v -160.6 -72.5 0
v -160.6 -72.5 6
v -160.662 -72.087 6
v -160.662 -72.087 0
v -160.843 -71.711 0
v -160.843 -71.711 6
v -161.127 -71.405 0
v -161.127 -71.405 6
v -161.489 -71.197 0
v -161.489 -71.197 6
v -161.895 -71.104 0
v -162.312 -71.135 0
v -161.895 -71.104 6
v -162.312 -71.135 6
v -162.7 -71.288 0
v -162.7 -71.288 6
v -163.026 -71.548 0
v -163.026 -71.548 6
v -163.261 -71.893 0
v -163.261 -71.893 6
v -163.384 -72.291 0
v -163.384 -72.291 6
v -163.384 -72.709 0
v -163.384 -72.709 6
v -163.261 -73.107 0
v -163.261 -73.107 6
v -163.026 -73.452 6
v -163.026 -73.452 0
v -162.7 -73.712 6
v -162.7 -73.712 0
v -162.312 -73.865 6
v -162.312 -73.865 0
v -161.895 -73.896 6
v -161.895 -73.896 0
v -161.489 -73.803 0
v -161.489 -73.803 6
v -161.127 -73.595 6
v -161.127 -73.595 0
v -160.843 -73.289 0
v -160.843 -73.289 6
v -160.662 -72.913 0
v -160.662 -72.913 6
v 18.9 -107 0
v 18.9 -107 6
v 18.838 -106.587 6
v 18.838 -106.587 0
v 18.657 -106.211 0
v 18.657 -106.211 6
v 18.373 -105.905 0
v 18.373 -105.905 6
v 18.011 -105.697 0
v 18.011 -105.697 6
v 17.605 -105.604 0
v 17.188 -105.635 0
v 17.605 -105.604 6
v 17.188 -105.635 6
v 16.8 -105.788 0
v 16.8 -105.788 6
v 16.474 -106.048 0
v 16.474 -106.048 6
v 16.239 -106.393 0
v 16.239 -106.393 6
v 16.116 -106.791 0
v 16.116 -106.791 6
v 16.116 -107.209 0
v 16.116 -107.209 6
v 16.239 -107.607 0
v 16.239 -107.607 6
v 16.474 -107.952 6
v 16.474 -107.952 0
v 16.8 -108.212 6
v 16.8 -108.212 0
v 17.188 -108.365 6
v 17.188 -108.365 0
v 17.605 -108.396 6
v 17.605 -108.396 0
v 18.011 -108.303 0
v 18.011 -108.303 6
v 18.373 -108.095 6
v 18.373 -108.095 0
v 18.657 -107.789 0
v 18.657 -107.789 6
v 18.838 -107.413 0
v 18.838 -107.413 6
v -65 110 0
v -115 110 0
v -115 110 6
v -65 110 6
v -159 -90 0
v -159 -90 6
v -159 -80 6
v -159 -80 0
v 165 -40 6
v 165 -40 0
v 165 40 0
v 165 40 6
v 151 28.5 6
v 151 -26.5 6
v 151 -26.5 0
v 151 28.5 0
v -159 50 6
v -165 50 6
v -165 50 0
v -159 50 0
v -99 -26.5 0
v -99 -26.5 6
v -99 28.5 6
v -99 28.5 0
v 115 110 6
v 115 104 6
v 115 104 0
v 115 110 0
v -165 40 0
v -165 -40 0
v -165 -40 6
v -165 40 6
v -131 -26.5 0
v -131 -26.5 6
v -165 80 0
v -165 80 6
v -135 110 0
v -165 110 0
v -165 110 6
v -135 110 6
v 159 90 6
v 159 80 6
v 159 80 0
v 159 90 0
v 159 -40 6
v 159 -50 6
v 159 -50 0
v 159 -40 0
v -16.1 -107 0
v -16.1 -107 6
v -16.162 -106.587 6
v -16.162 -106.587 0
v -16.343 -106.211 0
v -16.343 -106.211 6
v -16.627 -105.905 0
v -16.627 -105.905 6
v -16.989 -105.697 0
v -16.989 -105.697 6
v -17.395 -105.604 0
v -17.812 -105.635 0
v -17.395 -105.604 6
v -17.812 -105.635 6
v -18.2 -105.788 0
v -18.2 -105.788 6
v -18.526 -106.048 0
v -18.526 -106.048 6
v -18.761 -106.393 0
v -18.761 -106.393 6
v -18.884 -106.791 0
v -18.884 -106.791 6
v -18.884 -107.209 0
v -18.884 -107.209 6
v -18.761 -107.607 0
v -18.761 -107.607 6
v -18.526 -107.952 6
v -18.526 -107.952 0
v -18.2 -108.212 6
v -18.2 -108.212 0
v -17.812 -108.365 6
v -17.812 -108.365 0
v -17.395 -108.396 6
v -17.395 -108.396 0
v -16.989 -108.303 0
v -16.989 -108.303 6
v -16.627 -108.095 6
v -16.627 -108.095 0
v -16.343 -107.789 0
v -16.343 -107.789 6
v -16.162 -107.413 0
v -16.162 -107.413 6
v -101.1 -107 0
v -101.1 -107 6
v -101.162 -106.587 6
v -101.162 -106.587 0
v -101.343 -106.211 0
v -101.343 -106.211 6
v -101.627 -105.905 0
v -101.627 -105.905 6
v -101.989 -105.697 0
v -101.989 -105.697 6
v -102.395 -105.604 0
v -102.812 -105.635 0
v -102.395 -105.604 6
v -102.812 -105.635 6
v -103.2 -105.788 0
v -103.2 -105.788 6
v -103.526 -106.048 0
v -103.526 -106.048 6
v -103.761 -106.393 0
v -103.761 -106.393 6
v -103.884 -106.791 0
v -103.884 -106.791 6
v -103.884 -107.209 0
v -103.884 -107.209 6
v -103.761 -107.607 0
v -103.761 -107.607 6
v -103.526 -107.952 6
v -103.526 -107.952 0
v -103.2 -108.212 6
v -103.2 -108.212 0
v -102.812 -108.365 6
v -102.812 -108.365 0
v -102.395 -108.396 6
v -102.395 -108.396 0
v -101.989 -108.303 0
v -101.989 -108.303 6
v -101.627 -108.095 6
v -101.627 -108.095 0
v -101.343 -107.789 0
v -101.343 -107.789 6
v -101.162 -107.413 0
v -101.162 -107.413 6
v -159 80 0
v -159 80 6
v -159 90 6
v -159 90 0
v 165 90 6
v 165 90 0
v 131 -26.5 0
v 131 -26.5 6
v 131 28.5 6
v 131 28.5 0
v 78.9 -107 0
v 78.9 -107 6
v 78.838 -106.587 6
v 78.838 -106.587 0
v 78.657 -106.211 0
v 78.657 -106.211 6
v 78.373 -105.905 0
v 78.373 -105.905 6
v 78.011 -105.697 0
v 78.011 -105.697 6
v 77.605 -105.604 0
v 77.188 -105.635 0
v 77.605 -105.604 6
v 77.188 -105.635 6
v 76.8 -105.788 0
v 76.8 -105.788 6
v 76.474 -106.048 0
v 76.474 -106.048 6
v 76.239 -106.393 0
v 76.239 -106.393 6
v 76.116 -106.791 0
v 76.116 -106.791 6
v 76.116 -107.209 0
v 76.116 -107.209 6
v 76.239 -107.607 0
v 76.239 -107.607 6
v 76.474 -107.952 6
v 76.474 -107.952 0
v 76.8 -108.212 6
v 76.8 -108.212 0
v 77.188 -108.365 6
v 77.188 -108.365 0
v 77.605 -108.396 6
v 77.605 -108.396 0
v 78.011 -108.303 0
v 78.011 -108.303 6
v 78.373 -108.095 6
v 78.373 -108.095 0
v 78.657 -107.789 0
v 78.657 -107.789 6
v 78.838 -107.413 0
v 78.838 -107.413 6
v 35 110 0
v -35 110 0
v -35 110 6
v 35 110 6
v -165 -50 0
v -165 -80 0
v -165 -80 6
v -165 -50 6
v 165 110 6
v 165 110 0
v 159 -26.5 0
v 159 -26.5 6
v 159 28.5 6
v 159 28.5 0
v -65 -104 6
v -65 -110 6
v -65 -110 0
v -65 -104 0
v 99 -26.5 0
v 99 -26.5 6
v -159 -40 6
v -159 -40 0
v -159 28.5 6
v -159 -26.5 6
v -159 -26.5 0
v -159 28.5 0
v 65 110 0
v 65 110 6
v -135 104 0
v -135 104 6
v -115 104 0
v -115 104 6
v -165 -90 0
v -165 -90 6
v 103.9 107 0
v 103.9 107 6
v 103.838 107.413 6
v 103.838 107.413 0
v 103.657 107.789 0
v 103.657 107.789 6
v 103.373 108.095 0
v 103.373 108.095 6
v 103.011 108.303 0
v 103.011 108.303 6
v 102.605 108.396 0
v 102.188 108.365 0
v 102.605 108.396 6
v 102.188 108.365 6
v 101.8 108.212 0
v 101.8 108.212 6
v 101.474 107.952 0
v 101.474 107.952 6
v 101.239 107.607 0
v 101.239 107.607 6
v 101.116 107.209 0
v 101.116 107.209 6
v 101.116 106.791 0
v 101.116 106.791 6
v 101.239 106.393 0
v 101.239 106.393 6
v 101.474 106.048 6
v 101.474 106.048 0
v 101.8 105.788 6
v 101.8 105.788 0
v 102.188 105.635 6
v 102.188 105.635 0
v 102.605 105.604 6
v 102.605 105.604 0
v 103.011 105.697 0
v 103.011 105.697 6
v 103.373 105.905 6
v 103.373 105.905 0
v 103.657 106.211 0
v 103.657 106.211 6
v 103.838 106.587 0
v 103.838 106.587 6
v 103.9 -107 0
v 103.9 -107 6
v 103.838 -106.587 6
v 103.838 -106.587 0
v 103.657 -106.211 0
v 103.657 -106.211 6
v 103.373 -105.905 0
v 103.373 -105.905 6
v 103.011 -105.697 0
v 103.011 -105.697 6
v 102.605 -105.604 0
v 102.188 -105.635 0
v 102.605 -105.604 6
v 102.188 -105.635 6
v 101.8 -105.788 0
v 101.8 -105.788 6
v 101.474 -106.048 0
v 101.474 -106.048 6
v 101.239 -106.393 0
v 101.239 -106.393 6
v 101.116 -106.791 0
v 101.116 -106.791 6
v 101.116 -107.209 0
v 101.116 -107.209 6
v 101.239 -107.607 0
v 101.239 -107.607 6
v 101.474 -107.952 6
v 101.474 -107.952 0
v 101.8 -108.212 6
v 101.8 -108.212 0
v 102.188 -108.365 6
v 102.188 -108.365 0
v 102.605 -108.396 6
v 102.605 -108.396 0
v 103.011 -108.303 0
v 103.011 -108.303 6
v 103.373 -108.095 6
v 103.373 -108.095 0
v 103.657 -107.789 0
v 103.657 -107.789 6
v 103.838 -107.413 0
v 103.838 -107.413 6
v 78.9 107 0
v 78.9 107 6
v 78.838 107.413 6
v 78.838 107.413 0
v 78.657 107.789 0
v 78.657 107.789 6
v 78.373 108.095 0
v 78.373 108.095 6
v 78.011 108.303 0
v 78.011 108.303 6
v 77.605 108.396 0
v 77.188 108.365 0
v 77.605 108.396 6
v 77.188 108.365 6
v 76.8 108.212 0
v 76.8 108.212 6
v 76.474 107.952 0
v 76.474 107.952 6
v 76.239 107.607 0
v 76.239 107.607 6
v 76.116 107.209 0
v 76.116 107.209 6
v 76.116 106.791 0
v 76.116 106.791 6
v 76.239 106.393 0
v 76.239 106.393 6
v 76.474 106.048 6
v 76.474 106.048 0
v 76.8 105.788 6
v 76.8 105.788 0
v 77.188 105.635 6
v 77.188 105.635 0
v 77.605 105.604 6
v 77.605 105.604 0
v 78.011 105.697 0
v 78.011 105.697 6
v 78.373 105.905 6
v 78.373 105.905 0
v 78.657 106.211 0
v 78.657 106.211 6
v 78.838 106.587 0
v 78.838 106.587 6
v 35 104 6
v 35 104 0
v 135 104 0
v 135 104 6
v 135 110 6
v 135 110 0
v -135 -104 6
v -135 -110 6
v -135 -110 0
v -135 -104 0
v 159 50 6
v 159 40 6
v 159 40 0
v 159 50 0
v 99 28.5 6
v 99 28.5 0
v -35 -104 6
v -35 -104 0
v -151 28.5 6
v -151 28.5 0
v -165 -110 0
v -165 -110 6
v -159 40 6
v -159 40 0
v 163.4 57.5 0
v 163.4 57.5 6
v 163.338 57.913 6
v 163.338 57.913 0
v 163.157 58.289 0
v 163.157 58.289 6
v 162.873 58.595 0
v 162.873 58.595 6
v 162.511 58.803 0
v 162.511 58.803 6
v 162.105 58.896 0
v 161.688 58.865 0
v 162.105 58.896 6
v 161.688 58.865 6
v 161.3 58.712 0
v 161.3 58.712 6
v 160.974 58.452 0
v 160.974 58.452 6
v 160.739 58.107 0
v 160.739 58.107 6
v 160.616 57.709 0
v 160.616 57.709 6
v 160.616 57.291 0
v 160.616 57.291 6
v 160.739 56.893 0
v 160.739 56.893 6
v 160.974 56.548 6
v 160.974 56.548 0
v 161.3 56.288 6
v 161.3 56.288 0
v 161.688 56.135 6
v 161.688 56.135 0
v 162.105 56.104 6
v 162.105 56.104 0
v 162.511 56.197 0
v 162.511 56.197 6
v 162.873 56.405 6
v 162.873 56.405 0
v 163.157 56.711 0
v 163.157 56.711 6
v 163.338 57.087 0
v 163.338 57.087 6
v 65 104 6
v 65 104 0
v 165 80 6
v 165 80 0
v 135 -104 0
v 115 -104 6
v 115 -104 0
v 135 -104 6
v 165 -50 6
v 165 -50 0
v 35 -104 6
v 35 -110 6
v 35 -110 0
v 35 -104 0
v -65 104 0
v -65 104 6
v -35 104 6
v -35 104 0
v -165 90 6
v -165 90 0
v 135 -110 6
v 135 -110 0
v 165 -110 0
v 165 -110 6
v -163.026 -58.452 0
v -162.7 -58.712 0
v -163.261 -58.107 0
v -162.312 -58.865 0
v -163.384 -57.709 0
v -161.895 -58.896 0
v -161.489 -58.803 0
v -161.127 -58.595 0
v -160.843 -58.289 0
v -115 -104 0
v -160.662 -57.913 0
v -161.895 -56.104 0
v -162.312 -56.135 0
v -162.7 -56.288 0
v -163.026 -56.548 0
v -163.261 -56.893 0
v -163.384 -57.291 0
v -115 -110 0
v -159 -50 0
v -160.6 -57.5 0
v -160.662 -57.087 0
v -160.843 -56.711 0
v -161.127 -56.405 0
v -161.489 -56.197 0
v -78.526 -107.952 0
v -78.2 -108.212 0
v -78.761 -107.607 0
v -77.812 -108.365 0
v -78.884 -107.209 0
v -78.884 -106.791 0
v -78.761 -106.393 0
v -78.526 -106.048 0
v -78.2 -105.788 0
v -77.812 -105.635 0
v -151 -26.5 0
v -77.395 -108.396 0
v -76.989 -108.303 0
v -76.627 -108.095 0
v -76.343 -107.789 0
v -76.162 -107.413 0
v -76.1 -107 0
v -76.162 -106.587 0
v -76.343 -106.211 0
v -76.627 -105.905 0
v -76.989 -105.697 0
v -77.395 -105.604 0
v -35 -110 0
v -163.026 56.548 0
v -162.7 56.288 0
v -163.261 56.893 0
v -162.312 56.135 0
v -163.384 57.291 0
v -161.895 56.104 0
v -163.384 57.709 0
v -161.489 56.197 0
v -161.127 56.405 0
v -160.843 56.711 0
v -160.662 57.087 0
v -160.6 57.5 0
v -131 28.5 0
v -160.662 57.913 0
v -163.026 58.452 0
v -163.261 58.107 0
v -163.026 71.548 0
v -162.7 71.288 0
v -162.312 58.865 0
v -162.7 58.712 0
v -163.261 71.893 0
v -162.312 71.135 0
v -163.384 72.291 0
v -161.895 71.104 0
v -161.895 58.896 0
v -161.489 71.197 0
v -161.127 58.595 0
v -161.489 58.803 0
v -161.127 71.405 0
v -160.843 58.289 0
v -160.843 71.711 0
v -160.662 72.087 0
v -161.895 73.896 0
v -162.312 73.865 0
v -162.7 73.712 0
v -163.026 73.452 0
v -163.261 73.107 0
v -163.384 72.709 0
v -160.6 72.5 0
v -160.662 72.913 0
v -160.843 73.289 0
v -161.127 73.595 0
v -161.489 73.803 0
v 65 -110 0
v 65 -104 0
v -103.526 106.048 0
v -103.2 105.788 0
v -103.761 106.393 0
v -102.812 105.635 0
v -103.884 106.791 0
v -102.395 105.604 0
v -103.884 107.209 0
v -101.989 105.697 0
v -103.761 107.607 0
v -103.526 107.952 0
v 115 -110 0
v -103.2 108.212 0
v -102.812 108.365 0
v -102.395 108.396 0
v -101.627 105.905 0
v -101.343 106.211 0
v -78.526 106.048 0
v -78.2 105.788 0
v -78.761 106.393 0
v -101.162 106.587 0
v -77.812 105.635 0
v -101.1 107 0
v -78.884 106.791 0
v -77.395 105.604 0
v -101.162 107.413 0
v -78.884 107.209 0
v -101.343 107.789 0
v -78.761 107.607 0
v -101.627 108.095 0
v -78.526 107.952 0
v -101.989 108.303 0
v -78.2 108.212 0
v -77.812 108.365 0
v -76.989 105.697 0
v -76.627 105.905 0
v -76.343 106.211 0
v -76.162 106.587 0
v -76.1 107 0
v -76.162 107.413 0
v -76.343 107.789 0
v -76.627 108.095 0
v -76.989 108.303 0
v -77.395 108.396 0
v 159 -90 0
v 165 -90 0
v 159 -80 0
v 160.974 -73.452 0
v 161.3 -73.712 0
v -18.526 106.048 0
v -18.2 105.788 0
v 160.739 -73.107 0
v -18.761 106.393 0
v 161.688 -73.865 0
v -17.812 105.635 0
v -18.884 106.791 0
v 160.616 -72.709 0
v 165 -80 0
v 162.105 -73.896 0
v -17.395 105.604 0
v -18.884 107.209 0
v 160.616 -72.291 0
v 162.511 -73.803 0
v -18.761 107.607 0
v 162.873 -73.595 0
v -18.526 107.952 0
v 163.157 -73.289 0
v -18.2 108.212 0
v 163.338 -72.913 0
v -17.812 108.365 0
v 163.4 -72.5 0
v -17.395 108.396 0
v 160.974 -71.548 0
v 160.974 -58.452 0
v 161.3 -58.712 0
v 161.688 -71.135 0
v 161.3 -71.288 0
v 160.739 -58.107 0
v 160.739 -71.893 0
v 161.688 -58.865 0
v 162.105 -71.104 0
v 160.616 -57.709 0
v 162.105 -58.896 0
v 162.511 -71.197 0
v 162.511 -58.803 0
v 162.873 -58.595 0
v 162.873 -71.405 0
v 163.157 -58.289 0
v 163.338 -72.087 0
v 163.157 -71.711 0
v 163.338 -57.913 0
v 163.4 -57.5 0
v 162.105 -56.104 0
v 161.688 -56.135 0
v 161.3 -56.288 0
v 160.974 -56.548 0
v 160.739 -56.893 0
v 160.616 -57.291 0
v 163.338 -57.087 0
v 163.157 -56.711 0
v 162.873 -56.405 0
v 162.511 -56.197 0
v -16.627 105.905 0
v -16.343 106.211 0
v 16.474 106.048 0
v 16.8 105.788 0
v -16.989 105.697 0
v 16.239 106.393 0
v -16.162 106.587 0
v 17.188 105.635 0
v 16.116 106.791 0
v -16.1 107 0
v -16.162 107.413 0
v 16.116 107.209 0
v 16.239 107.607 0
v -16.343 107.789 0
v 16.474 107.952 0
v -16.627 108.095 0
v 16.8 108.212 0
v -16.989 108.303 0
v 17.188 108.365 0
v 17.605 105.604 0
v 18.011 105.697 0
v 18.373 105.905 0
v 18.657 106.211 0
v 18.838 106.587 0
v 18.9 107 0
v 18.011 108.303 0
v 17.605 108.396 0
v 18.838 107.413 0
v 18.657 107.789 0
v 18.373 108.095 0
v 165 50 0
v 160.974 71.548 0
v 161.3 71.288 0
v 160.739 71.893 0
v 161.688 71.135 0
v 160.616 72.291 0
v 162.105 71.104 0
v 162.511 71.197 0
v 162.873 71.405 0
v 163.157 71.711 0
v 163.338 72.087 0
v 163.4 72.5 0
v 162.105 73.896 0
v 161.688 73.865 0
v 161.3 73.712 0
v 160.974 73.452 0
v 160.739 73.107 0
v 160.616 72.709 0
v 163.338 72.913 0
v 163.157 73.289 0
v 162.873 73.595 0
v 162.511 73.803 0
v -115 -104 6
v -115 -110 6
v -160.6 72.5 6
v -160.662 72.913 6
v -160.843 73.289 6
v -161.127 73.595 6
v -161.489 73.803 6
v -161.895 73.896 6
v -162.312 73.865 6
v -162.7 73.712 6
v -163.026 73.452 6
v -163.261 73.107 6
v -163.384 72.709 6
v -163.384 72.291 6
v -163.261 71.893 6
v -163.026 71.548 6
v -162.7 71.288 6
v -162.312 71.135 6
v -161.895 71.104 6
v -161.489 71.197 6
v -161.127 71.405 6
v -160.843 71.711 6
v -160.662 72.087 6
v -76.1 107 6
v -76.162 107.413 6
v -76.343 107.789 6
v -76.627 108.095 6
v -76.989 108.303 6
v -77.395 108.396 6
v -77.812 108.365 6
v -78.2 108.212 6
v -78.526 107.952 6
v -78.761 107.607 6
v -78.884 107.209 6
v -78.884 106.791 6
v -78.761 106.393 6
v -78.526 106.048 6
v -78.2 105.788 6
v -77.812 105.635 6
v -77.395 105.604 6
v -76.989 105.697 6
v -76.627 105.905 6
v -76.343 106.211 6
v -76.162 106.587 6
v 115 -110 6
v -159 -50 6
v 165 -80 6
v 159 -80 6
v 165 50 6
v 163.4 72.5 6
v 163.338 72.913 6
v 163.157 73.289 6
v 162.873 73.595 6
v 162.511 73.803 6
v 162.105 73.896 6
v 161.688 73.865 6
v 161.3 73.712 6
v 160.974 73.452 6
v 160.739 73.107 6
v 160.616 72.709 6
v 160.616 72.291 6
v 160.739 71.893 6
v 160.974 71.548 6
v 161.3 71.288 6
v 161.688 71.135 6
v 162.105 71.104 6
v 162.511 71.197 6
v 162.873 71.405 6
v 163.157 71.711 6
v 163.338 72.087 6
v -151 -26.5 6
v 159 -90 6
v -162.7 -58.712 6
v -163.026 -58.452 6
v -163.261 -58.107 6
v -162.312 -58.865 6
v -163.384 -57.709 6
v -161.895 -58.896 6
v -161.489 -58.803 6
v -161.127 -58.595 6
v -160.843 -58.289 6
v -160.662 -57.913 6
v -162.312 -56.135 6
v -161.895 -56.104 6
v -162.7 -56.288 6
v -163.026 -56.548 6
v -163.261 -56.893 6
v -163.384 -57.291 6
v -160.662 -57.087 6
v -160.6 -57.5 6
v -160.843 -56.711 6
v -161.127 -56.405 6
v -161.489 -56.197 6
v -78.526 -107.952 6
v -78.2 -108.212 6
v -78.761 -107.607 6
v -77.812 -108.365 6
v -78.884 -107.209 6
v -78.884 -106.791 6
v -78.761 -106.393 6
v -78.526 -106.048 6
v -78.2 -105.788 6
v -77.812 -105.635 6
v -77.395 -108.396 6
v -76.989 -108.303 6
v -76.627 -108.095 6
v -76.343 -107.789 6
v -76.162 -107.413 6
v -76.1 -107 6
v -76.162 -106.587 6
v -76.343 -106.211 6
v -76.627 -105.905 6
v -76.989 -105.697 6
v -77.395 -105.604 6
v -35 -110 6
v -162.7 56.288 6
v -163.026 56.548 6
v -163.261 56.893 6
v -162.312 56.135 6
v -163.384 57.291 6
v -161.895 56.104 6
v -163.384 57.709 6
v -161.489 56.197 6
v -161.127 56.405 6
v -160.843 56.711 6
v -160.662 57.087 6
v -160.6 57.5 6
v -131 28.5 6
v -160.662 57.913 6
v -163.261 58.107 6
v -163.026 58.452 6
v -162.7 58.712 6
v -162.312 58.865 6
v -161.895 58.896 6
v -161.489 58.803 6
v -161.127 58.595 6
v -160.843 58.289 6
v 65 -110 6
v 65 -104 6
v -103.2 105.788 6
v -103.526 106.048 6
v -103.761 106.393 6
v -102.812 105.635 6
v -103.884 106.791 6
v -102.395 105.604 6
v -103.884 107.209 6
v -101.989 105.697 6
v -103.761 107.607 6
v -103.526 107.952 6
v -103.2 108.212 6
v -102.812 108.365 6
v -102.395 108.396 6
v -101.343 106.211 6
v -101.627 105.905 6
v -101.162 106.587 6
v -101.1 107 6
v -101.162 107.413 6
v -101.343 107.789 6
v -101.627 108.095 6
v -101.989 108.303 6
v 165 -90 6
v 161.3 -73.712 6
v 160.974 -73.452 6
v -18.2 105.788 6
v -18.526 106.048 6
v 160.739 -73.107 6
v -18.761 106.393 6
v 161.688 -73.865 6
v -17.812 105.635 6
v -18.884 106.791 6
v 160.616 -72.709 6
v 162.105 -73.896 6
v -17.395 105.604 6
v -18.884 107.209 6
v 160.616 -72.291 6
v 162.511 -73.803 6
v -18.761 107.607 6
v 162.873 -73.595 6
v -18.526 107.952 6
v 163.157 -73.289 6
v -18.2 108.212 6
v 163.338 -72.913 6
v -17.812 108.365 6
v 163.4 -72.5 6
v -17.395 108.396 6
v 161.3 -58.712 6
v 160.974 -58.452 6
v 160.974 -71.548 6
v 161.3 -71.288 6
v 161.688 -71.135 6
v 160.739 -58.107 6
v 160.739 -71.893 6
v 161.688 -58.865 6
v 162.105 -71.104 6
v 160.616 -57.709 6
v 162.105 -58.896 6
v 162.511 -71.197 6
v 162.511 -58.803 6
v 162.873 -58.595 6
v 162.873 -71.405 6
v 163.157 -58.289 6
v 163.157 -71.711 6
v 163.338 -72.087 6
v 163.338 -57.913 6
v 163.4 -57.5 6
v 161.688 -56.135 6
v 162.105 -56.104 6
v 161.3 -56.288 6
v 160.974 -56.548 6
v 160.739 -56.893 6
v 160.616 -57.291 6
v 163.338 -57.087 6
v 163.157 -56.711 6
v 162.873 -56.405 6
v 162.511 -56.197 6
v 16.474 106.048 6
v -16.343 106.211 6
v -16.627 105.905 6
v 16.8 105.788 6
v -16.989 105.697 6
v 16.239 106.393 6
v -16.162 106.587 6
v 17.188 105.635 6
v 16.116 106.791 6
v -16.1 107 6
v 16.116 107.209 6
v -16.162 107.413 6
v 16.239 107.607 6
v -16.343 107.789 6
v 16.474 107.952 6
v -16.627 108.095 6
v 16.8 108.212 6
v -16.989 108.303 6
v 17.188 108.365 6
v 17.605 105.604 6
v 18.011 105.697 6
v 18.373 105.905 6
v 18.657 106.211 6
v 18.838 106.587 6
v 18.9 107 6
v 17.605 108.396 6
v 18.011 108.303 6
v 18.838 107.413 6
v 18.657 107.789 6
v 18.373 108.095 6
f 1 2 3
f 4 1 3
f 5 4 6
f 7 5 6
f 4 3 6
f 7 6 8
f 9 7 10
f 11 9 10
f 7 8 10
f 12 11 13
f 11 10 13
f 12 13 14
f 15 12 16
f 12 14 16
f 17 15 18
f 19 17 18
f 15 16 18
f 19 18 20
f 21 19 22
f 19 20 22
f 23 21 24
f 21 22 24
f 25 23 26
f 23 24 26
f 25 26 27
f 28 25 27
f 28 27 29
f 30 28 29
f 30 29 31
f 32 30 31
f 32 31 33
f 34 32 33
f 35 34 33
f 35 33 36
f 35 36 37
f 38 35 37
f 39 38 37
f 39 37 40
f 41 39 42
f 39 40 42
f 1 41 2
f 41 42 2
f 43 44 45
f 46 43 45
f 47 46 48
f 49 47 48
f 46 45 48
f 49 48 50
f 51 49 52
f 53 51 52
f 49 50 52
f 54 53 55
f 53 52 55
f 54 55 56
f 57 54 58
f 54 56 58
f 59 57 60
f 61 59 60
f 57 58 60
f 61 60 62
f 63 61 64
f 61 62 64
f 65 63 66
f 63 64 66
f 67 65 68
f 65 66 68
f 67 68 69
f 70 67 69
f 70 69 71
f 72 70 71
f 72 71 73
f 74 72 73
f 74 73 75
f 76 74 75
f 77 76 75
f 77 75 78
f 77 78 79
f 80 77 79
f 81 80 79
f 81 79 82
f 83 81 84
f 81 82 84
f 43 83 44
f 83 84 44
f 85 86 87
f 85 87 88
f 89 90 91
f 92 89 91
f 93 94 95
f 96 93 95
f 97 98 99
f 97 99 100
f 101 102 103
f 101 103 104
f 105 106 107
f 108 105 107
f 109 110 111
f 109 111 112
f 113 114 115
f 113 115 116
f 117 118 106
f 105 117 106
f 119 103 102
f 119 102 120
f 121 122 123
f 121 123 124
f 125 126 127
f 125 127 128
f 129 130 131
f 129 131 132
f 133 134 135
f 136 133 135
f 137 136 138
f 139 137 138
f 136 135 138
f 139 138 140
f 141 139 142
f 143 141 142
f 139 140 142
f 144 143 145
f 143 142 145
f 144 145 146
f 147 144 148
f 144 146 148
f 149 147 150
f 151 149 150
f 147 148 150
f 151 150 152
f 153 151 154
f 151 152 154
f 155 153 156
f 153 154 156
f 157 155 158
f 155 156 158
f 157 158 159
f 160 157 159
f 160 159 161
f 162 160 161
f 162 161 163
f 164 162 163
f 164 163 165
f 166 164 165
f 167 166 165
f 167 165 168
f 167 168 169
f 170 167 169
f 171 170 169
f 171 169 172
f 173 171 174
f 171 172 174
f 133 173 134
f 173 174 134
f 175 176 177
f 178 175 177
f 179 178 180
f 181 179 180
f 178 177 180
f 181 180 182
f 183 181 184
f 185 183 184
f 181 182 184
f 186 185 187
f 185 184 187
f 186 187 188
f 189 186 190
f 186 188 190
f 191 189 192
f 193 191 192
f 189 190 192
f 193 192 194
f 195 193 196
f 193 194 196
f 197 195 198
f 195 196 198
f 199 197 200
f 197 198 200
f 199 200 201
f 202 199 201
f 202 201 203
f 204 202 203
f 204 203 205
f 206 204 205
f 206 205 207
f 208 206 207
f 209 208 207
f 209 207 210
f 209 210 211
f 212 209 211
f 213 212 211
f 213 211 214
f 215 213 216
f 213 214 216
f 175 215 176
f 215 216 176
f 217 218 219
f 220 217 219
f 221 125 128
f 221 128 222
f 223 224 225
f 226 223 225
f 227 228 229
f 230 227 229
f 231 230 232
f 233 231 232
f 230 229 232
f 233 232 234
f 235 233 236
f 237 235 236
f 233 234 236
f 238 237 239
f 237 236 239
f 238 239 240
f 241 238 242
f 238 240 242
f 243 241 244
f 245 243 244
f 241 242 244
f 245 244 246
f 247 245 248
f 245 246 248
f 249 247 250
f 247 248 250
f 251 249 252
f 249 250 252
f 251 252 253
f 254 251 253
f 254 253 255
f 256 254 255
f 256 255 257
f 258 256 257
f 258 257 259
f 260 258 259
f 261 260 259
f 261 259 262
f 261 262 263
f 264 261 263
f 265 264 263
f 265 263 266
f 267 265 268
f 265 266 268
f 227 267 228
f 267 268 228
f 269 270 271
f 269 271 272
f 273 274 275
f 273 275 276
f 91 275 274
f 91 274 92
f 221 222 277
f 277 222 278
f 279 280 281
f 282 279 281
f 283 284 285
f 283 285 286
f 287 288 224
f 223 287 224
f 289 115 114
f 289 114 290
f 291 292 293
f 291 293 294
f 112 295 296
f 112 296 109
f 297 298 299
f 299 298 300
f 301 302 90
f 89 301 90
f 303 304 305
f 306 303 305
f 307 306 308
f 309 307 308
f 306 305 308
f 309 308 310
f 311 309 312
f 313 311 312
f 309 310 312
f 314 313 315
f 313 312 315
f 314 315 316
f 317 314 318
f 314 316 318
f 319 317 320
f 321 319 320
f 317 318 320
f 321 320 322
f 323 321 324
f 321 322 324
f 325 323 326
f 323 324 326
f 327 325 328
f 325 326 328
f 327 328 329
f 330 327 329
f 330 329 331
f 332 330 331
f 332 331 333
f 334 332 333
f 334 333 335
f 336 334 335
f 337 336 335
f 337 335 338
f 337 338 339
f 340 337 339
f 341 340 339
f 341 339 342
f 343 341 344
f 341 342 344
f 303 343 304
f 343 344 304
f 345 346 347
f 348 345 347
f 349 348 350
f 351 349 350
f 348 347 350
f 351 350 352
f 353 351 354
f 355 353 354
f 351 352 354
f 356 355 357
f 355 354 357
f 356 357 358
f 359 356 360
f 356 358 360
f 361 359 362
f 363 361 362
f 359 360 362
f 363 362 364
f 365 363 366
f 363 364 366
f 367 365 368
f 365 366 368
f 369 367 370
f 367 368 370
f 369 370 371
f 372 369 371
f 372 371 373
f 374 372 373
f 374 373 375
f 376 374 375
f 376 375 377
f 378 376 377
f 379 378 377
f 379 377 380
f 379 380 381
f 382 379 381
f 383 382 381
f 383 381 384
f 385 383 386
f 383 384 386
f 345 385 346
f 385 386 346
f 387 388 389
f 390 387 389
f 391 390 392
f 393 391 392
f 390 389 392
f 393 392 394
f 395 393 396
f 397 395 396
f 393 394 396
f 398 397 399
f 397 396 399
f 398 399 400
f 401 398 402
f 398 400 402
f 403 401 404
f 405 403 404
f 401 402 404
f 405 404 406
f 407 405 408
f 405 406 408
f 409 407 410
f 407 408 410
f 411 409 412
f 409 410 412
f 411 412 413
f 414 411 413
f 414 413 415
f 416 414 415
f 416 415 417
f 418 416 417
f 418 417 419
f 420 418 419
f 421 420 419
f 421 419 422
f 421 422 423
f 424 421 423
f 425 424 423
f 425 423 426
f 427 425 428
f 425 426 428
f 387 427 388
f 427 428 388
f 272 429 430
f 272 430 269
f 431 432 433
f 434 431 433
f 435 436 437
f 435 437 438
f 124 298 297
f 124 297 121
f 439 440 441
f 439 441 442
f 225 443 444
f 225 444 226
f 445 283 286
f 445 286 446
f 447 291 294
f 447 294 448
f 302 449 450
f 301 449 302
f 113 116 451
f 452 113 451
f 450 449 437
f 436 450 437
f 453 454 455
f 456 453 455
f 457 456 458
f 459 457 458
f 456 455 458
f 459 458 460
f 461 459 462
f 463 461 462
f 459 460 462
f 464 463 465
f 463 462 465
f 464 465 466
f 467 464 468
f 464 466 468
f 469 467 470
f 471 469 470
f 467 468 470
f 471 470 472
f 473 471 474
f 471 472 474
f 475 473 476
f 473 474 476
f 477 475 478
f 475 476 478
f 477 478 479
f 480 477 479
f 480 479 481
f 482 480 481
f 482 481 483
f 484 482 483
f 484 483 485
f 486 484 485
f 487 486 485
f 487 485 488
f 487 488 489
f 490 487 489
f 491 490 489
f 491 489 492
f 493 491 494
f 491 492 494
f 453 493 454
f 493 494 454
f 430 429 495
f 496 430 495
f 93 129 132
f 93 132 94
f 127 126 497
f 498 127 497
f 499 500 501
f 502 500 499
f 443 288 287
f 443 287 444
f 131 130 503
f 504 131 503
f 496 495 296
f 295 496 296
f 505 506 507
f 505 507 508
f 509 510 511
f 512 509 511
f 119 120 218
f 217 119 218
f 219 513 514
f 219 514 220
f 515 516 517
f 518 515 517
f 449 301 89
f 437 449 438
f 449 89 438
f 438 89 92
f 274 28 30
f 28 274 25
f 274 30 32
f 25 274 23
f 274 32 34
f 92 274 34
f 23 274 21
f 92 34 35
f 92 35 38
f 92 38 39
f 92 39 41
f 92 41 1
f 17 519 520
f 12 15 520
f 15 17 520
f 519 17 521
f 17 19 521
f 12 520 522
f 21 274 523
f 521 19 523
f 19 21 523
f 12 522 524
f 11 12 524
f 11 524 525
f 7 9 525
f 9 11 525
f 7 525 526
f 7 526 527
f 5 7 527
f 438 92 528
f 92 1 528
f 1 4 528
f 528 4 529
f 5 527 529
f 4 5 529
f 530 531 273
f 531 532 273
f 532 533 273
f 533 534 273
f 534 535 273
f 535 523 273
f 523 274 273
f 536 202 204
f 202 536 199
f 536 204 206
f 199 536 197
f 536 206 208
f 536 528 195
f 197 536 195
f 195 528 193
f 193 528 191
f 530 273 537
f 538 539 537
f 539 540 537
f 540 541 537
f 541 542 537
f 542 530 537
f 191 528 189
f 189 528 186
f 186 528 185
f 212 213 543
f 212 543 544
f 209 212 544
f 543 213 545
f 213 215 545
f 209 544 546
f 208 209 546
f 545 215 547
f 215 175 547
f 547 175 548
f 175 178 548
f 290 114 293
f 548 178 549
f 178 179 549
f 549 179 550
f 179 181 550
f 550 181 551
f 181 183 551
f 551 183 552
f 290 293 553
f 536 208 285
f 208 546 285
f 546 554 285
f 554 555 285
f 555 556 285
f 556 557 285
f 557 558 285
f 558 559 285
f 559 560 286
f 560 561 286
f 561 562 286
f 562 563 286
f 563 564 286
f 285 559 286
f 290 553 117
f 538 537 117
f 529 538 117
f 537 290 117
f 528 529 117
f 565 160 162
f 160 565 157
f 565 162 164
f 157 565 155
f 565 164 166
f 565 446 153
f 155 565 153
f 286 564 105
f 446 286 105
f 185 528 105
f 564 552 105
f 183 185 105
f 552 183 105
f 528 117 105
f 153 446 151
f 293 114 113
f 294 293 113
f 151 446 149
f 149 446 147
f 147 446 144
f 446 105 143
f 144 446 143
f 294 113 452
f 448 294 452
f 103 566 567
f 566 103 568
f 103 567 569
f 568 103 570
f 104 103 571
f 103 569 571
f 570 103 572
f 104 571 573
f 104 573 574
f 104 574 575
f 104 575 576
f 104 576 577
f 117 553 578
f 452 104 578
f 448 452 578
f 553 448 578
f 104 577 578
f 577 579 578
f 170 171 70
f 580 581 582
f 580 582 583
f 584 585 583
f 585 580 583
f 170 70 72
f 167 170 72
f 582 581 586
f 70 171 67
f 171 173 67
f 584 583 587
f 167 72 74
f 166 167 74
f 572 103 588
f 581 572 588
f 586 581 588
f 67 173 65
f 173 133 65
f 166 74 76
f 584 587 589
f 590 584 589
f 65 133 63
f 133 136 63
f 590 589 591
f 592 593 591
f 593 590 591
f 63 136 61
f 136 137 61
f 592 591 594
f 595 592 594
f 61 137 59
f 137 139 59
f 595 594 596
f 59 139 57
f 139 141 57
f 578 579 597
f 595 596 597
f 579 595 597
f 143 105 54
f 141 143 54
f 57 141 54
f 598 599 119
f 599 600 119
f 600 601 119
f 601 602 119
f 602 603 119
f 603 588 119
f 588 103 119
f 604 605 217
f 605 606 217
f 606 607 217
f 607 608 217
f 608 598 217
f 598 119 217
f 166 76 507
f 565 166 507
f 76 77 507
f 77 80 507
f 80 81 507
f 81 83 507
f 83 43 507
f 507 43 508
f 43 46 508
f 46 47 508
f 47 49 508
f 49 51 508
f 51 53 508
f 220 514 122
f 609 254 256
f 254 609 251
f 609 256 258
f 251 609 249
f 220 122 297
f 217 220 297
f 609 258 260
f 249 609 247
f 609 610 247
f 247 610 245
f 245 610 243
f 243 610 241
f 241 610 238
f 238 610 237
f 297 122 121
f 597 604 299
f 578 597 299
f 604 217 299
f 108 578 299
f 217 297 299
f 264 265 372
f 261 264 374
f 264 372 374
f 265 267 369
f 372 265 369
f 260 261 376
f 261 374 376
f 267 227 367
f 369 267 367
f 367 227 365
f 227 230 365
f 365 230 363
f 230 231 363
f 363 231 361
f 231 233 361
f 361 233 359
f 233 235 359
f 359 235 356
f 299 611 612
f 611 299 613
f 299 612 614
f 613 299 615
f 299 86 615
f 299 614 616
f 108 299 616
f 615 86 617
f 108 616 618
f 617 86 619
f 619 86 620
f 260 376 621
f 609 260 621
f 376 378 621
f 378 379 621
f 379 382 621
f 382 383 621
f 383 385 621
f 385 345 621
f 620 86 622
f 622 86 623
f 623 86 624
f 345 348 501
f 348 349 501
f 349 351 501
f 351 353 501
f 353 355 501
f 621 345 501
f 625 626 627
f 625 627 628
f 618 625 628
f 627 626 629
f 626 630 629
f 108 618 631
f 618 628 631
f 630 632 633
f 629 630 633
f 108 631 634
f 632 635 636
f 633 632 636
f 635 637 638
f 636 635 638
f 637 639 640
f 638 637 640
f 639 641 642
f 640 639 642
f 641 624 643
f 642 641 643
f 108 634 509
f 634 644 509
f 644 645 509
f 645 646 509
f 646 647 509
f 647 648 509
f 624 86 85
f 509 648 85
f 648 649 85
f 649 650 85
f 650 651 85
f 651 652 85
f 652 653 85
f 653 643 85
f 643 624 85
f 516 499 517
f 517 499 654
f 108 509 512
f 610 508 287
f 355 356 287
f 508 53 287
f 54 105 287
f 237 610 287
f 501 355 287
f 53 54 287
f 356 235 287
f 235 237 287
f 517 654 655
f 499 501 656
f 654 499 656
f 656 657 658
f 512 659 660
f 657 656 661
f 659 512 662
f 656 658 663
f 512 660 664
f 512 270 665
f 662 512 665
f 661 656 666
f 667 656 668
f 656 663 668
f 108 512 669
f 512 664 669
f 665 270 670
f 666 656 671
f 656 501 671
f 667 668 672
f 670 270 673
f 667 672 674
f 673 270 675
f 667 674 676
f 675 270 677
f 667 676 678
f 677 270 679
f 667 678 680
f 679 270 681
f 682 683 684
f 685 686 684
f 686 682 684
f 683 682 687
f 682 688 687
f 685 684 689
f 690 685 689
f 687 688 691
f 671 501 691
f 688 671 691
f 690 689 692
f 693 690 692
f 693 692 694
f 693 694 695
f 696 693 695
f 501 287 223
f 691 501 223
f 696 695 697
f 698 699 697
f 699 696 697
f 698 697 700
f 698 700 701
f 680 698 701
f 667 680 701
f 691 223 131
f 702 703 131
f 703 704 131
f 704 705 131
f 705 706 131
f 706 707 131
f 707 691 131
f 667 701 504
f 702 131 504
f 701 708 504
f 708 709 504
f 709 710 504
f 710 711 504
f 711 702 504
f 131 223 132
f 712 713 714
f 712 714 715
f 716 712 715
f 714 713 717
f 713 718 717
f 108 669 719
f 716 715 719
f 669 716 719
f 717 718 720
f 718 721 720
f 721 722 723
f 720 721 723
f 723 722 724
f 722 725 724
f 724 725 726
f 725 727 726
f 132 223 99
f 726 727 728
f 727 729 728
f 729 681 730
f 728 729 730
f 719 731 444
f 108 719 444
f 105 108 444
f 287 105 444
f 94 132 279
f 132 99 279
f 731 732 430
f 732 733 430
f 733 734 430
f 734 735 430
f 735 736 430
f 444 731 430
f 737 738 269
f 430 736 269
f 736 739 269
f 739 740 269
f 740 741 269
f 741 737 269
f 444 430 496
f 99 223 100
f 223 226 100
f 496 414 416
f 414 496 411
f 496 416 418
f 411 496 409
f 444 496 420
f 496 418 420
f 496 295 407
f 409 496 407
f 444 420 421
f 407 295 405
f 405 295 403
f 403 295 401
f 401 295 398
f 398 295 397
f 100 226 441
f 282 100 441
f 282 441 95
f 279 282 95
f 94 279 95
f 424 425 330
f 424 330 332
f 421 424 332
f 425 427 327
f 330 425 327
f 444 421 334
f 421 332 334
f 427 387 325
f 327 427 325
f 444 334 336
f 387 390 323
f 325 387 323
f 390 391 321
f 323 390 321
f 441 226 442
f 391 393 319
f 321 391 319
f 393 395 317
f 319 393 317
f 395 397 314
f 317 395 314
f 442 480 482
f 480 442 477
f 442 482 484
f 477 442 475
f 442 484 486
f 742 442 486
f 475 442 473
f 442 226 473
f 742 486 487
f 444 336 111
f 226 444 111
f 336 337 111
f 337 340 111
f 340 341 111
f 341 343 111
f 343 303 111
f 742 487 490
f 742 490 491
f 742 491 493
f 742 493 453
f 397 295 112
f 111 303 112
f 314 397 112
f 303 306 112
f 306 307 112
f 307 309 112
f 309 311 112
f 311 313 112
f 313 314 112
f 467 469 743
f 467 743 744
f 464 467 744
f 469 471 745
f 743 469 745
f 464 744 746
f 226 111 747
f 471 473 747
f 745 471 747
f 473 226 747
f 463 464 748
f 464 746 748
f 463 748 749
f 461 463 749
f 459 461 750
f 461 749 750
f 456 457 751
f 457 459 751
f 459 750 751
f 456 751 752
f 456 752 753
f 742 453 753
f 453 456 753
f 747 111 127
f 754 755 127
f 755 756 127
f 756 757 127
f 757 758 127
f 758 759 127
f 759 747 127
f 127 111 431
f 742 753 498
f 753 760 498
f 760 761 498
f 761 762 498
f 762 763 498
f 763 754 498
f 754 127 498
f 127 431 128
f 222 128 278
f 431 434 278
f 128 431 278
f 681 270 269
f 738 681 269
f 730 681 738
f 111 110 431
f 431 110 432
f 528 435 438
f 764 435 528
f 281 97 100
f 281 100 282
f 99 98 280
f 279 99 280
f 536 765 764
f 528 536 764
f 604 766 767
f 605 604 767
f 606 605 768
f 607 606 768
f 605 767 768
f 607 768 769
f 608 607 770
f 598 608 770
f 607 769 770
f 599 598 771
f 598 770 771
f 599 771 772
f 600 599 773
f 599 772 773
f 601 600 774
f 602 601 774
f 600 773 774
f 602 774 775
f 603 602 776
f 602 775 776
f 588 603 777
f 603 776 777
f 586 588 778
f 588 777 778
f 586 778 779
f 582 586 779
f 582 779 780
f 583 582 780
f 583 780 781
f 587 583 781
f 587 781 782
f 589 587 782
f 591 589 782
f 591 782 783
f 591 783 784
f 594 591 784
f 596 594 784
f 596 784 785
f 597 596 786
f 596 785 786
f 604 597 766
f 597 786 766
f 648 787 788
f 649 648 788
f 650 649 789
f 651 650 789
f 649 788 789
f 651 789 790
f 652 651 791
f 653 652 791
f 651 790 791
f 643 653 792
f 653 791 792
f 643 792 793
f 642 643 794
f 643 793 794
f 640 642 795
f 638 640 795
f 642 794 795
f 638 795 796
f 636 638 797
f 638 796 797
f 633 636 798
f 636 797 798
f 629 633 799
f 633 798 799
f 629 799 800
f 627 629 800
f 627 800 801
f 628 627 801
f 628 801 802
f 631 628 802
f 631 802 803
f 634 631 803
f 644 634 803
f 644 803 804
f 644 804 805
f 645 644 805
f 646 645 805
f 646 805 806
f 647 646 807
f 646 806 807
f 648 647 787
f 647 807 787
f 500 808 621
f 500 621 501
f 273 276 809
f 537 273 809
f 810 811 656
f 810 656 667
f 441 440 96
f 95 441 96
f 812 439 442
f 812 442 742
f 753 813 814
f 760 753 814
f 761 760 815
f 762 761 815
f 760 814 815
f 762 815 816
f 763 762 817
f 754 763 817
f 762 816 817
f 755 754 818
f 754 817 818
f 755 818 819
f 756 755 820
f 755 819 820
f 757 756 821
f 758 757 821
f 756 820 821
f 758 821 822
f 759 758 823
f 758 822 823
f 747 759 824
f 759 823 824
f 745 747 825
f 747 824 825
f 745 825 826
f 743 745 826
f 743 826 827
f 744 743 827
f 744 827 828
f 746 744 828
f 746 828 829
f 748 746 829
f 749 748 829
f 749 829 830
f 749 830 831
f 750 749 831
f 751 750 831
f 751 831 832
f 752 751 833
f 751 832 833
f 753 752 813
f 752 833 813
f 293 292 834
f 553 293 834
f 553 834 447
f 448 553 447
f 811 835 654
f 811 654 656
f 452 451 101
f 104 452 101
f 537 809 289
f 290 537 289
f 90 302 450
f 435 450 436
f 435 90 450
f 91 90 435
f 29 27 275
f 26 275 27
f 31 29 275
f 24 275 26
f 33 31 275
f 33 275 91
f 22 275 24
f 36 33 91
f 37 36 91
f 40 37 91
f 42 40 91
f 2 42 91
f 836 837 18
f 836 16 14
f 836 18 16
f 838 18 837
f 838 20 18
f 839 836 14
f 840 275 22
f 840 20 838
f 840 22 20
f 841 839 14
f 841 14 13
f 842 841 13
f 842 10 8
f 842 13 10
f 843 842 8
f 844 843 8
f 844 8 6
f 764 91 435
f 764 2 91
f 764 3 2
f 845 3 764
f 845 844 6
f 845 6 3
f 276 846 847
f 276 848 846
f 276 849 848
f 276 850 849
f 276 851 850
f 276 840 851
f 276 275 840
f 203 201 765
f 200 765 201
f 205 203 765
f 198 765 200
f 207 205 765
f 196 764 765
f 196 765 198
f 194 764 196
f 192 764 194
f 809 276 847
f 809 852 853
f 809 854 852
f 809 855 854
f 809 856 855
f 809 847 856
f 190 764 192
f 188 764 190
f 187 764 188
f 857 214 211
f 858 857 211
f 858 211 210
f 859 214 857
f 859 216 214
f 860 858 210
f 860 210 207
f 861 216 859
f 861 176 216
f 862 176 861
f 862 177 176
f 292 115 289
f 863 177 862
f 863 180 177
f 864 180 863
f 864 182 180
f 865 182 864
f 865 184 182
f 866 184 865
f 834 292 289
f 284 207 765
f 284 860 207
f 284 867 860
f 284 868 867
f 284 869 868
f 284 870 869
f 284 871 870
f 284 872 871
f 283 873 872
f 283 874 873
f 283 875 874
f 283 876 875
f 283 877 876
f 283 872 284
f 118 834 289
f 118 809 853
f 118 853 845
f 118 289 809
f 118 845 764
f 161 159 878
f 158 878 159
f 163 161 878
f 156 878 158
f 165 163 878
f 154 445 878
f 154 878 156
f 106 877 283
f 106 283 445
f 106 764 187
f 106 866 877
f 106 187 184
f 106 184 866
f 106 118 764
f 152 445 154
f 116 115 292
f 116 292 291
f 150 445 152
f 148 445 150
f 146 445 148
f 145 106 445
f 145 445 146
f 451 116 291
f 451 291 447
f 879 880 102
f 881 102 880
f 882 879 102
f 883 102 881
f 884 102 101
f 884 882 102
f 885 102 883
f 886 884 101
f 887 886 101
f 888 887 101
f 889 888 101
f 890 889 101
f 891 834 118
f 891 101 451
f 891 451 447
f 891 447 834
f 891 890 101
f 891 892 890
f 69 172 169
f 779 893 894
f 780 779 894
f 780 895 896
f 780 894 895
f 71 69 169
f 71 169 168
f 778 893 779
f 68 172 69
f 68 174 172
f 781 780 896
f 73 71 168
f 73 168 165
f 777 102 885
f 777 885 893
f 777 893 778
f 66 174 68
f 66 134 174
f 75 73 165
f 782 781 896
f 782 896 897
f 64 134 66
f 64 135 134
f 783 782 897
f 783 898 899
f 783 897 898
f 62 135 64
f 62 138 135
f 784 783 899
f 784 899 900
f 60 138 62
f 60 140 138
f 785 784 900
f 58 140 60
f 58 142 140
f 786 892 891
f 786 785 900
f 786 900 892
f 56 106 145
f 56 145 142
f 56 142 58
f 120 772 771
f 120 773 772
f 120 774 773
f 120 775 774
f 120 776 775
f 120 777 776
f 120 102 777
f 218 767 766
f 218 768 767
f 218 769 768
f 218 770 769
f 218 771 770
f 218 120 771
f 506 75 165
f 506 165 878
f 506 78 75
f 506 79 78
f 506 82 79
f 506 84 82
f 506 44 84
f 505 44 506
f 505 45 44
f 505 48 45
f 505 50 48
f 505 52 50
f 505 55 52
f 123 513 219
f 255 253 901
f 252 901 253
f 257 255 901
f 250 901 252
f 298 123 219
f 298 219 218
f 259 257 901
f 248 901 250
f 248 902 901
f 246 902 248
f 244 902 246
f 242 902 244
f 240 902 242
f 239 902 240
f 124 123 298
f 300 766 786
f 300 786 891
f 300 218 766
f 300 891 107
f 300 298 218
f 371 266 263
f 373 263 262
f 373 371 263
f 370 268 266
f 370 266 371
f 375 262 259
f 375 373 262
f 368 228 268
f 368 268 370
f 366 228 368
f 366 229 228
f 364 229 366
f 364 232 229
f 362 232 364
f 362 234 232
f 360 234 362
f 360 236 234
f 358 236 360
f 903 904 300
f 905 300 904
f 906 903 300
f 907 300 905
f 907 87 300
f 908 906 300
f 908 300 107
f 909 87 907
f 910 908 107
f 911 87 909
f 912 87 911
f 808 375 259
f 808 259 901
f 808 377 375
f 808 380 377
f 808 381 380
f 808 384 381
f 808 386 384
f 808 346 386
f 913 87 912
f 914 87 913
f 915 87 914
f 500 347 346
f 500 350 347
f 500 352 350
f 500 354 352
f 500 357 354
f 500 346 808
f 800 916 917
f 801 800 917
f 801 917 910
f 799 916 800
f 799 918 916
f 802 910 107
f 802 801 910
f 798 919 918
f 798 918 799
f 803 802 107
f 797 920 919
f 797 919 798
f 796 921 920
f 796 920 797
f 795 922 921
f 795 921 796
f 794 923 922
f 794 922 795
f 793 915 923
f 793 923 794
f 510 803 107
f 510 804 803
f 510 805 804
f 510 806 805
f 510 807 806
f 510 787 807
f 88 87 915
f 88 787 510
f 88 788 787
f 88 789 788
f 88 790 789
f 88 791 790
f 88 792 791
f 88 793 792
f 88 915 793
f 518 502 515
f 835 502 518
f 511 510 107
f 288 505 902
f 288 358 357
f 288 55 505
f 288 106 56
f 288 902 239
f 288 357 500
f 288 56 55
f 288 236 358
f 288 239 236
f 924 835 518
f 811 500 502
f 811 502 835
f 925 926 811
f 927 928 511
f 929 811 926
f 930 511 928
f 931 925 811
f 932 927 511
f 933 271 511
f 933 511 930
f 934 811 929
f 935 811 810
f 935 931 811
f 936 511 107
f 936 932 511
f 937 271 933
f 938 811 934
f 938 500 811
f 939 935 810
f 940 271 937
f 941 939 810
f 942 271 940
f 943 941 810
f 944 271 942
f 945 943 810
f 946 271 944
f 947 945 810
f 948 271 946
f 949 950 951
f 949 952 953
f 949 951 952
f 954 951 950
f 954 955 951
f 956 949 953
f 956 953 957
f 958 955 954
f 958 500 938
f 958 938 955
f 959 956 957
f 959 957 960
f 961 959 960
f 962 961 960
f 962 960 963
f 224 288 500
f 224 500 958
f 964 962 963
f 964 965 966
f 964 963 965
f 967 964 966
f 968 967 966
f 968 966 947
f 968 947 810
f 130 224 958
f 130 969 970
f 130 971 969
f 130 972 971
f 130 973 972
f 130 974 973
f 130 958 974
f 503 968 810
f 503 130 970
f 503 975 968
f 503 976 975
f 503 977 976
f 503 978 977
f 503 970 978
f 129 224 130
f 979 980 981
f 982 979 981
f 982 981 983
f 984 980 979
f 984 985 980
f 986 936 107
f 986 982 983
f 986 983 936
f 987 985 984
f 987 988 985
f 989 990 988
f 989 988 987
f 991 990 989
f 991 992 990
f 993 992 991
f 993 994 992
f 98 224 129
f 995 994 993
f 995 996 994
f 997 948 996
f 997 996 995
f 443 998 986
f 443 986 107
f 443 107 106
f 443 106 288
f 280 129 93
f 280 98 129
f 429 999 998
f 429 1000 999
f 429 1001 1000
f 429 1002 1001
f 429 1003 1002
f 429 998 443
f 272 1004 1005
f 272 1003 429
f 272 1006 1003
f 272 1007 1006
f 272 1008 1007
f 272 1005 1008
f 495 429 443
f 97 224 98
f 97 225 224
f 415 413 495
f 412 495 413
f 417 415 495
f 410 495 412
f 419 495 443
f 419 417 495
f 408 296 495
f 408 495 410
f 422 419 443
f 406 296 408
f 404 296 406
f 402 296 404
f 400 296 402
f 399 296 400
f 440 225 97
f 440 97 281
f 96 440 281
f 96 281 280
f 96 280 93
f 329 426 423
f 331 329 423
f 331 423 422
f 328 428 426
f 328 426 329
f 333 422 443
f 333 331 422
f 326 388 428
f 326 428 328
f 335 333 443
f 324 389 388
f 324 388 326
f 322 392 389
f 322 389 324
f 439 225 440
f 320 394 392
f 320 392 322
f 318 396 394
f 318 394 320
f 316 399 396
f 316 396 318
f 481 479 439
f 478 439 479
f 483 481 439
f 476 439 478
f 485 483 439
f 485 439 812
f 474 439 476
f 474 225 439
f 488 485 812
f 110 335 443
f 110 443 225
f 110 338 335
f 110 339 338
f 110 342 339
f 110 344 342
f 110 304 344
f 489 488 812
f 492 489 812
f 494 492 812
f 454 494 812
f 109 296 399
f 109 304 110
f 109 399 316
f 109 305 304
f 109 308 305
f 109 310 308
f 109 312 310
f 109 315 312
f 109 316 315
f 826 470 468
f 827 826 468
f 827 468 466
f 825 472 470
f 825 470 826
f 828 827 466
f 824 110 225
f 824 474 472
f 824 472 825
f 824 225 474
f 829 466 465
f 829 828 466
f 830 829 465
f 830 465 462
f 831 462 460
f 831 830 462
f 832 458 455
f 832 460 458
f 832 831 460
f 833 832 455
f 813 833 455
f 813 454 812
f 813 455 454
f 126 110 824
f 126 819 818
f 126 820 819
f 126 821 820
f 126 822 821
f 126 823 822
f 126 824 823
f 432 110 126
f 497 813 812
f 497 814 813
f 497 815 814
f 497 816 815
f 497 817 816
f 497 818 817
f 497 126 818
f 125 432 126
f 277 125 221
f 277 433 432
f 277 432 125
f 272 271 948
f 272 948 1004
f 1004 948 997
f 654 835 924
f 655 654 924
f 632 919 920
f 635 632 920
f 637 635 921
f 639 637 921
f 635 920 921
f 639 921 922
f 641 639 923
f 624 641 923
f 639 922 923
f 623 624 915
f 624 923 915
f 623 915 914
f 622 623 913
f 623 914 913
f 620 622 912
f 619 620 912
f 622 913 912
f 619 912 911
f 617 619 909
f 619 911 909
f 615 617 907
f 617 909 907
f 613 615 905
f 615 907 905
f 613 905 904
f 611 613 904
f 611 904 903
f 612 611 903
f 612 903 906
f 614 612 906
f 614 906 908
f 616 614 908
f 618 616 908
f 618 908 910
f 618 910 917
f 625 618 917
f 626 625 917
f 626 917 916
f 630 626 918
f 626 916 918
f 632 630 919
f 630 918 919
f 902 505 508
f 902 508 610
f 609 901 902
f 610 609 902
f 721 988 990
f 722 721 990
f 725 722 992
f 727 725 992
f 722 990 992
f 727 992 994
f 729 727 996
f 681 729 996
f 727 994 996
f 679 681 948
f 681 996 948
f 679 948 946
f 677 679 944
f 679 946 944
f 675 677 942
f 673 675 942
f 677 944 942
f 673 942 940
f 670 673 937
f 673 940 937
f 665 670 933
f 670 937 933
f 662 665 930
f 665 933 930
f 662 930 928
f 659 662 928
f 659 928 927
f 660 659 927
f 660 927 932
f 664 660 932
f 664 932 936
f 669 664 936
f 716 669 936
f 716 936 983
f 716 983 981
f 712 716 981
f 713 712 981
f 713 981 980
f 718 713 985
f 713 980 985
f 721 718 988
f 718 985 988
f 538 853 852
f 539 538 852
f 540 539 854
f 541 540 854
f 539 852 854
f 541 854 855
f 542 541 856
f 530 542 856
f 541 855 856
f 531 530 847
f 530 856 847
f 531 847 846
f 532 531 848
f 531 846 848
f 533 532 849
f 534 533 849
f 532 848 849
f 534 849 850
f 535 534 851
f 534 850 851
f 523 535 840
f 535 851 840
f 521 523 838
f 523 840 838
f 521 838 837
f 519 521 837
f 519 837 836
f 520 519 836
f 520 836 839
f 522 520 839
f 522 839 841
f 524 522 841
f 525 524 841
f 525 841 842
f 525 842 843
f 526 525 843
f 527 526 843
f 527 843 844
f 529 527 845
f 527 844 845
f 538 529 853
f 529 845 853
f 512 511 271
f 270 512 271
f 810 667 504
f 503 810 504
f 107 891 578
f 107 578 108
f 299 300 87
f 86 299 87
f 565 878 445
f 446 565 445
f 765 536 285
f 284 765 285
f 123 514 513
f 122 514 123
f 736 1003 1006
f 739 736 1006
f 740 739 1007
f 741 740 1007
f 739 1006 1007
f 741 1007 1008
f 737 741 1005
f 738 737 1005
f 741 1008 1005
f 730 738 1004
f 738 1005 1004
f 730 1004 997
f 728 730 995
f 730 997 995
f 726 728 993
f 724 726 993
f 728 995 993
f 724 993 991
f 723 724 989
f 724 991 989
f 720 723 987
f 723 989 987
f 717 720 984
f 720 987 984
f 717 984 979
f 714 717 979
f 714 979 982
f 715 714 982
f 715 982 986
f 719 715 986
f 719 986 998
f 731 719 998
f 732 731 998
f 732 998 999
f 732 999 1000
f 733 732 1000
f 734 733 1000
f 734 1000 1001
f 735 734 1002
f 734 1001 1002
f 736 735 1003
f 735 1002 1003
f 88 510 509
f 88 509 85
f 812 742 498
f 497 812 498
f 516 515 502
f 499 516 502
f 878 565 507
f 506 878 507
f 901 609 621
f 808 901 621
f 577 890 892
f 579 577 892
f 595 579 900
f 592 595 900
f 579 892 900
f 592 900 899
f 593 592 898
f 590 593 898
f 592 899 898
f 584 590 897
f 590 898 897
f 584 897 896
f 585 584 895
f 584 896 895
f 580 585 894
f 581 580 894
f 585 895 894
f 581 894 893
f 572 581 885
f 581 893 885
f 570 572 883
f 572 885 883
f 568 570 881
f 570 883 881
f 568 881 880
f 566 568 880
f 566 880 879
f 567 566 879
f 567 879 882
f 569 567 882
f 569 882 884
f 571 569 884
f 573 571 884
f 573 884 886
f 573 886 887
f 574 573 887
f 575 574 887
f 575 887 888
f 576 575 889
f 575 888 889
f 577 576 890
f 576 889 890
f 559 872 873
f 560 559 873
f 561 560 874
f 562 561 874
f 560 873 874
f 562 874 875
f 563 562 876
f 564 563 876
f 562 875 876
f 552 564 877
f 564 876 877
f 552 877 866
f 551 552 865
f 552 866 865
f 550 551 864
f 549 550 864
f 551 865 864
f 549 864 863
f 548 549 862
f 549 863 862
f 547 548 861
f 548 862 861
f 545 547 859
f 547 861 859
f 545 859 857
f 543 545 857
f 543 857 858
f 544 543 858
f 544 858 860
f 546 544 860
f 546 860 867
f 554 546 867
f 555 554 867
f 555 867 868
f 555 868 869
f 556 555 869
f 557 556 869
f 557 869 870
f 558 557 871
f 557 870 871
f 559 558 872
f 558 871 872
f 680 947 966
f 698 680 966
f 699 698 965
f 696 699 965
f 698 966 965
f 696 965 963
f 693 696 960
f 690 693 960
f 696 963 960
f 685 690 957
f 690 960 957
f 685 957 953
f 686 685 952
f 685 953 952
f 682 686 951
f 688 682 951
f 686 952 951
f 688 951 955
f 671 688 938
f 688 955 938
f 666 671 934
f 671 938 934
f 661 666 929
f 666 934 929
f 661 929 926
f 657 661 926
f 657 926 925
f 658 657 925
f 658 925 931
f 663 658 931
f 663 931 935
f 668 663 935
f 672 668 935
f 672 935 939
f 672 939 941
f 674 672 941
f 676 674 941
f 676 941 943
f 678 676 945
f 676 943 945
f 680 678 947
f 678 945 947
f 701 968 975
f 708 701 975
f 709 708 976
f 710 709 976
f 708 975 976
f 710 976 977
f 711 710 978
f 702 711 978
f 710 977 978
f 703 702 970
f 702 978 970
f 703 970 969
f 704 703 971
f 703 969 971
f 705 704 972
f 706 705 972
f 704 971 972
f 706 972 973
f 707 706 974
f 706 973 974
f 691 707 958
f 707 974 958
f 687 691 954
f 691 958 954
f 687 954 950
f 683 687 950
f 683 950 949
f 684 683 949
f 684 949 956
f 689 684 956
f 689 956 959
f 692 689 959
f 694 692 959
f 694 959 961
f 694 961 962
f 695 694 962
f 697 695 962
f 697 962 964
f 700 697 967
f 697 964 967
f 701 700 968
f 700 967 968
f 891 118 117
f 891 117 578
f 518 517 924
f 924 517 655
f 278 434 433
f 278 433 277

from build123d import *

# Parameters (mm, degrees)
ESQUISSE1_W             = 330
ESQUISSE1_H             = 220
BOSS_EXTRU_1_DEPTH      = 6
ESQUISSE2_W             = 8
ESQUISSE2_H             = 55
ESQUISSE2_W_2           = 32
ENL_V_MAT_EXTRU_1_DEPTH = 6
ESQUISSE3_W             = 20
ESQUISSE3_H             = 6
ESQUISSE3_W_2           = 30
ESQUISSE3_W_3           = 6
ESQUISSE3_H_2           = 10
ENL_V_MAT_EXTRU_2_DEPTH = 6
ESQUISSE4_R             = 1.4
ENL_V_MAT_EXTRU_3_DEPTH = 6


with BuildPart() as part:
    # Esquisse1 → Boss.-Extru.1 (new body)
    with BuildSketch(Plane.XY):
        Rectangle(ESQUISSE1_W, ESQUISSE1_H)
    extrude(amount=BOSS_EXTRU_1_DEPTH)

    # Esquisse2 → Enlèv. mat.-Extru.1 (cut)
    with BuildSketch(Plane.XY.offset(6)):
        with Locations((-155, 1)):
            Rectangle(ESQUISSE2_W, ESQUISSE2_H)
        with Locations((-115, 1)):
            Rectangle(ESQUISSE2_W_2, ESQUISSE2_H)
        with Locations((115, 1)):
            Rectangle(ESQUISSE2_W_2, ESQUISSE2_H)
        with Locations((155, 1)):
            Rectangle(ESQUISSE2_W, ESQUISSE2_H)
    extrude(amount=-ENL_V_MAT_EXTRU_1_DEPTH, mode=Mode.SUBTRACT)

    # Esquisse3 → Enlèv. mat.-Extru.2 (cut)
    with BuildSketch(Plane.XY.offset(6)):
        with Locations((-125, 107)):
            Rectangle(ESQUISSE3_W, ESQUISSE3_H)
        with Locations((-50, 107)):
            Rectangle(ESQUISSE3_W_2, ESQUISSE3_H)
        with Locations((-162, 45)):
            Rectangle(ESQUISSE3_W_3, ESQUISSE3_H_2)
        with Locations((50, 107)):
            Rectangle(ESQUISSE3_W_2, ESQUISSE3_H)
        with Locations((-162, 85)):
            Rectangle(ESQUISSE3_W_3, ESQUISSE3_H_2)
        with Locations((162, 85)):
            Rectangle(ESQUISSE3_W_3, ESQUISSE3_H_2)
        with Locations((162, 45)):
            Rectangle(ESQUISSE3_W_3, ESQUISSE3_H_2)
        with Locations((125, 107)):
            Rectangle(ESQUISSE3_W, ESQUISSE3_H)
        with Locations((125, -107)):
            Rectangle(ESQUISSE3_W, ESQUISSE3_H)
        with Locations((50, -107)):
            Rectangle(ESQUISSE3_W_2, ESQUISSE3_H)
        with Locations((162, -45)):
            Rectangle(ESQUISSE3_W_3, ESQUISSE3_H_2)
        with Locations((162, -85)):
            Rectangle(ESQUISSE3_W_3, ESQUISSE3_H_2)
        with Locations((-162, -85)):
            Rectangle(ESQUISSE3_W_3, ESQUISSE3_H_2)
        with Locations((-162, -45)):
            Rectangle(ESQUISSE3_W_3, ESQUISSE3_H_2)
        with Locations((-50, -107)):
            Rectangle(ESQUISSE3_W_2, ESQUISSE3_H)
        with Locations((-125, -107)):
            Rectangle(ESQUISSE3_W, ESQUISSE3_H)
    extrude(amount=-ENL_V_MAT_EXTRU_2_DEPTH, mode=Mode.SUBTRACT)

    # Esquisse4 → Enlèv. mat.-Extru.3 (cut)
    with BuildSketch(Plane.XY.offset(6)):
        with Locations((-102.5, 107)):
            Circle(ESQUISSE4_R)
        with Locations((-77.5, 107)):
            Circle(ESQUISSE4_R)
        with Locations((-17.5, 107)):
            Circle(ESQUISSE4_R)
        with Locations((-162, 72.5)):
            Circle(ESQUISSE4_R)
        with Locations((-162, 57.5)):
            Circle(ESQUISSE4_R)
        with Locations((162, 57.5)):
            Circle(ESQUISSE4_R)
        with Locations((162, 72.5)):
            Circle(ESQUISSE4_R)
        with Locations((17.5, 107)):
            Circle(ESQUISSE4_R)
        with Locations((77.5, 107)):
            Circle(ESQUISSE4_R)
        with Locations((102.5, 107)):
            Circle(ESQUISSE4_R)
        with Locations((102.5, -107)):
            Circle(ESQUISSE4_R)
        with Locations((77.5, -107)):
            Circle(ESQUISSE4_R)
        with Locations((17.5, -107)):
            Circle(ESQUISSE4_R)
        with Locations((162, -72.5)):
            Circle(ESQUISSE4_R)
        with Locations((162, -57.5)):
            Circle(ESQUISSE4_R)
        with Locations((-162, -57.5)):
            Circle(ESQUISSE4_R)
        with Locations((-162, -72.5)):
            Circle(ESQUISSE4_R)
        with Locations((-17.5, -107)):
            Circle(ESQUISSE4_R)
        with Locations((-77.5, -107)):
            Circle(ESQUISSE4_R)
        with Locations((-102.5, -107)):
            Circle(ESQUISSE4_R)
    extrude(amount=-ENL_V_MAT_EXTRU_3_DEPTH, mode=Mode.SUBTRACT)


solid = part.part
